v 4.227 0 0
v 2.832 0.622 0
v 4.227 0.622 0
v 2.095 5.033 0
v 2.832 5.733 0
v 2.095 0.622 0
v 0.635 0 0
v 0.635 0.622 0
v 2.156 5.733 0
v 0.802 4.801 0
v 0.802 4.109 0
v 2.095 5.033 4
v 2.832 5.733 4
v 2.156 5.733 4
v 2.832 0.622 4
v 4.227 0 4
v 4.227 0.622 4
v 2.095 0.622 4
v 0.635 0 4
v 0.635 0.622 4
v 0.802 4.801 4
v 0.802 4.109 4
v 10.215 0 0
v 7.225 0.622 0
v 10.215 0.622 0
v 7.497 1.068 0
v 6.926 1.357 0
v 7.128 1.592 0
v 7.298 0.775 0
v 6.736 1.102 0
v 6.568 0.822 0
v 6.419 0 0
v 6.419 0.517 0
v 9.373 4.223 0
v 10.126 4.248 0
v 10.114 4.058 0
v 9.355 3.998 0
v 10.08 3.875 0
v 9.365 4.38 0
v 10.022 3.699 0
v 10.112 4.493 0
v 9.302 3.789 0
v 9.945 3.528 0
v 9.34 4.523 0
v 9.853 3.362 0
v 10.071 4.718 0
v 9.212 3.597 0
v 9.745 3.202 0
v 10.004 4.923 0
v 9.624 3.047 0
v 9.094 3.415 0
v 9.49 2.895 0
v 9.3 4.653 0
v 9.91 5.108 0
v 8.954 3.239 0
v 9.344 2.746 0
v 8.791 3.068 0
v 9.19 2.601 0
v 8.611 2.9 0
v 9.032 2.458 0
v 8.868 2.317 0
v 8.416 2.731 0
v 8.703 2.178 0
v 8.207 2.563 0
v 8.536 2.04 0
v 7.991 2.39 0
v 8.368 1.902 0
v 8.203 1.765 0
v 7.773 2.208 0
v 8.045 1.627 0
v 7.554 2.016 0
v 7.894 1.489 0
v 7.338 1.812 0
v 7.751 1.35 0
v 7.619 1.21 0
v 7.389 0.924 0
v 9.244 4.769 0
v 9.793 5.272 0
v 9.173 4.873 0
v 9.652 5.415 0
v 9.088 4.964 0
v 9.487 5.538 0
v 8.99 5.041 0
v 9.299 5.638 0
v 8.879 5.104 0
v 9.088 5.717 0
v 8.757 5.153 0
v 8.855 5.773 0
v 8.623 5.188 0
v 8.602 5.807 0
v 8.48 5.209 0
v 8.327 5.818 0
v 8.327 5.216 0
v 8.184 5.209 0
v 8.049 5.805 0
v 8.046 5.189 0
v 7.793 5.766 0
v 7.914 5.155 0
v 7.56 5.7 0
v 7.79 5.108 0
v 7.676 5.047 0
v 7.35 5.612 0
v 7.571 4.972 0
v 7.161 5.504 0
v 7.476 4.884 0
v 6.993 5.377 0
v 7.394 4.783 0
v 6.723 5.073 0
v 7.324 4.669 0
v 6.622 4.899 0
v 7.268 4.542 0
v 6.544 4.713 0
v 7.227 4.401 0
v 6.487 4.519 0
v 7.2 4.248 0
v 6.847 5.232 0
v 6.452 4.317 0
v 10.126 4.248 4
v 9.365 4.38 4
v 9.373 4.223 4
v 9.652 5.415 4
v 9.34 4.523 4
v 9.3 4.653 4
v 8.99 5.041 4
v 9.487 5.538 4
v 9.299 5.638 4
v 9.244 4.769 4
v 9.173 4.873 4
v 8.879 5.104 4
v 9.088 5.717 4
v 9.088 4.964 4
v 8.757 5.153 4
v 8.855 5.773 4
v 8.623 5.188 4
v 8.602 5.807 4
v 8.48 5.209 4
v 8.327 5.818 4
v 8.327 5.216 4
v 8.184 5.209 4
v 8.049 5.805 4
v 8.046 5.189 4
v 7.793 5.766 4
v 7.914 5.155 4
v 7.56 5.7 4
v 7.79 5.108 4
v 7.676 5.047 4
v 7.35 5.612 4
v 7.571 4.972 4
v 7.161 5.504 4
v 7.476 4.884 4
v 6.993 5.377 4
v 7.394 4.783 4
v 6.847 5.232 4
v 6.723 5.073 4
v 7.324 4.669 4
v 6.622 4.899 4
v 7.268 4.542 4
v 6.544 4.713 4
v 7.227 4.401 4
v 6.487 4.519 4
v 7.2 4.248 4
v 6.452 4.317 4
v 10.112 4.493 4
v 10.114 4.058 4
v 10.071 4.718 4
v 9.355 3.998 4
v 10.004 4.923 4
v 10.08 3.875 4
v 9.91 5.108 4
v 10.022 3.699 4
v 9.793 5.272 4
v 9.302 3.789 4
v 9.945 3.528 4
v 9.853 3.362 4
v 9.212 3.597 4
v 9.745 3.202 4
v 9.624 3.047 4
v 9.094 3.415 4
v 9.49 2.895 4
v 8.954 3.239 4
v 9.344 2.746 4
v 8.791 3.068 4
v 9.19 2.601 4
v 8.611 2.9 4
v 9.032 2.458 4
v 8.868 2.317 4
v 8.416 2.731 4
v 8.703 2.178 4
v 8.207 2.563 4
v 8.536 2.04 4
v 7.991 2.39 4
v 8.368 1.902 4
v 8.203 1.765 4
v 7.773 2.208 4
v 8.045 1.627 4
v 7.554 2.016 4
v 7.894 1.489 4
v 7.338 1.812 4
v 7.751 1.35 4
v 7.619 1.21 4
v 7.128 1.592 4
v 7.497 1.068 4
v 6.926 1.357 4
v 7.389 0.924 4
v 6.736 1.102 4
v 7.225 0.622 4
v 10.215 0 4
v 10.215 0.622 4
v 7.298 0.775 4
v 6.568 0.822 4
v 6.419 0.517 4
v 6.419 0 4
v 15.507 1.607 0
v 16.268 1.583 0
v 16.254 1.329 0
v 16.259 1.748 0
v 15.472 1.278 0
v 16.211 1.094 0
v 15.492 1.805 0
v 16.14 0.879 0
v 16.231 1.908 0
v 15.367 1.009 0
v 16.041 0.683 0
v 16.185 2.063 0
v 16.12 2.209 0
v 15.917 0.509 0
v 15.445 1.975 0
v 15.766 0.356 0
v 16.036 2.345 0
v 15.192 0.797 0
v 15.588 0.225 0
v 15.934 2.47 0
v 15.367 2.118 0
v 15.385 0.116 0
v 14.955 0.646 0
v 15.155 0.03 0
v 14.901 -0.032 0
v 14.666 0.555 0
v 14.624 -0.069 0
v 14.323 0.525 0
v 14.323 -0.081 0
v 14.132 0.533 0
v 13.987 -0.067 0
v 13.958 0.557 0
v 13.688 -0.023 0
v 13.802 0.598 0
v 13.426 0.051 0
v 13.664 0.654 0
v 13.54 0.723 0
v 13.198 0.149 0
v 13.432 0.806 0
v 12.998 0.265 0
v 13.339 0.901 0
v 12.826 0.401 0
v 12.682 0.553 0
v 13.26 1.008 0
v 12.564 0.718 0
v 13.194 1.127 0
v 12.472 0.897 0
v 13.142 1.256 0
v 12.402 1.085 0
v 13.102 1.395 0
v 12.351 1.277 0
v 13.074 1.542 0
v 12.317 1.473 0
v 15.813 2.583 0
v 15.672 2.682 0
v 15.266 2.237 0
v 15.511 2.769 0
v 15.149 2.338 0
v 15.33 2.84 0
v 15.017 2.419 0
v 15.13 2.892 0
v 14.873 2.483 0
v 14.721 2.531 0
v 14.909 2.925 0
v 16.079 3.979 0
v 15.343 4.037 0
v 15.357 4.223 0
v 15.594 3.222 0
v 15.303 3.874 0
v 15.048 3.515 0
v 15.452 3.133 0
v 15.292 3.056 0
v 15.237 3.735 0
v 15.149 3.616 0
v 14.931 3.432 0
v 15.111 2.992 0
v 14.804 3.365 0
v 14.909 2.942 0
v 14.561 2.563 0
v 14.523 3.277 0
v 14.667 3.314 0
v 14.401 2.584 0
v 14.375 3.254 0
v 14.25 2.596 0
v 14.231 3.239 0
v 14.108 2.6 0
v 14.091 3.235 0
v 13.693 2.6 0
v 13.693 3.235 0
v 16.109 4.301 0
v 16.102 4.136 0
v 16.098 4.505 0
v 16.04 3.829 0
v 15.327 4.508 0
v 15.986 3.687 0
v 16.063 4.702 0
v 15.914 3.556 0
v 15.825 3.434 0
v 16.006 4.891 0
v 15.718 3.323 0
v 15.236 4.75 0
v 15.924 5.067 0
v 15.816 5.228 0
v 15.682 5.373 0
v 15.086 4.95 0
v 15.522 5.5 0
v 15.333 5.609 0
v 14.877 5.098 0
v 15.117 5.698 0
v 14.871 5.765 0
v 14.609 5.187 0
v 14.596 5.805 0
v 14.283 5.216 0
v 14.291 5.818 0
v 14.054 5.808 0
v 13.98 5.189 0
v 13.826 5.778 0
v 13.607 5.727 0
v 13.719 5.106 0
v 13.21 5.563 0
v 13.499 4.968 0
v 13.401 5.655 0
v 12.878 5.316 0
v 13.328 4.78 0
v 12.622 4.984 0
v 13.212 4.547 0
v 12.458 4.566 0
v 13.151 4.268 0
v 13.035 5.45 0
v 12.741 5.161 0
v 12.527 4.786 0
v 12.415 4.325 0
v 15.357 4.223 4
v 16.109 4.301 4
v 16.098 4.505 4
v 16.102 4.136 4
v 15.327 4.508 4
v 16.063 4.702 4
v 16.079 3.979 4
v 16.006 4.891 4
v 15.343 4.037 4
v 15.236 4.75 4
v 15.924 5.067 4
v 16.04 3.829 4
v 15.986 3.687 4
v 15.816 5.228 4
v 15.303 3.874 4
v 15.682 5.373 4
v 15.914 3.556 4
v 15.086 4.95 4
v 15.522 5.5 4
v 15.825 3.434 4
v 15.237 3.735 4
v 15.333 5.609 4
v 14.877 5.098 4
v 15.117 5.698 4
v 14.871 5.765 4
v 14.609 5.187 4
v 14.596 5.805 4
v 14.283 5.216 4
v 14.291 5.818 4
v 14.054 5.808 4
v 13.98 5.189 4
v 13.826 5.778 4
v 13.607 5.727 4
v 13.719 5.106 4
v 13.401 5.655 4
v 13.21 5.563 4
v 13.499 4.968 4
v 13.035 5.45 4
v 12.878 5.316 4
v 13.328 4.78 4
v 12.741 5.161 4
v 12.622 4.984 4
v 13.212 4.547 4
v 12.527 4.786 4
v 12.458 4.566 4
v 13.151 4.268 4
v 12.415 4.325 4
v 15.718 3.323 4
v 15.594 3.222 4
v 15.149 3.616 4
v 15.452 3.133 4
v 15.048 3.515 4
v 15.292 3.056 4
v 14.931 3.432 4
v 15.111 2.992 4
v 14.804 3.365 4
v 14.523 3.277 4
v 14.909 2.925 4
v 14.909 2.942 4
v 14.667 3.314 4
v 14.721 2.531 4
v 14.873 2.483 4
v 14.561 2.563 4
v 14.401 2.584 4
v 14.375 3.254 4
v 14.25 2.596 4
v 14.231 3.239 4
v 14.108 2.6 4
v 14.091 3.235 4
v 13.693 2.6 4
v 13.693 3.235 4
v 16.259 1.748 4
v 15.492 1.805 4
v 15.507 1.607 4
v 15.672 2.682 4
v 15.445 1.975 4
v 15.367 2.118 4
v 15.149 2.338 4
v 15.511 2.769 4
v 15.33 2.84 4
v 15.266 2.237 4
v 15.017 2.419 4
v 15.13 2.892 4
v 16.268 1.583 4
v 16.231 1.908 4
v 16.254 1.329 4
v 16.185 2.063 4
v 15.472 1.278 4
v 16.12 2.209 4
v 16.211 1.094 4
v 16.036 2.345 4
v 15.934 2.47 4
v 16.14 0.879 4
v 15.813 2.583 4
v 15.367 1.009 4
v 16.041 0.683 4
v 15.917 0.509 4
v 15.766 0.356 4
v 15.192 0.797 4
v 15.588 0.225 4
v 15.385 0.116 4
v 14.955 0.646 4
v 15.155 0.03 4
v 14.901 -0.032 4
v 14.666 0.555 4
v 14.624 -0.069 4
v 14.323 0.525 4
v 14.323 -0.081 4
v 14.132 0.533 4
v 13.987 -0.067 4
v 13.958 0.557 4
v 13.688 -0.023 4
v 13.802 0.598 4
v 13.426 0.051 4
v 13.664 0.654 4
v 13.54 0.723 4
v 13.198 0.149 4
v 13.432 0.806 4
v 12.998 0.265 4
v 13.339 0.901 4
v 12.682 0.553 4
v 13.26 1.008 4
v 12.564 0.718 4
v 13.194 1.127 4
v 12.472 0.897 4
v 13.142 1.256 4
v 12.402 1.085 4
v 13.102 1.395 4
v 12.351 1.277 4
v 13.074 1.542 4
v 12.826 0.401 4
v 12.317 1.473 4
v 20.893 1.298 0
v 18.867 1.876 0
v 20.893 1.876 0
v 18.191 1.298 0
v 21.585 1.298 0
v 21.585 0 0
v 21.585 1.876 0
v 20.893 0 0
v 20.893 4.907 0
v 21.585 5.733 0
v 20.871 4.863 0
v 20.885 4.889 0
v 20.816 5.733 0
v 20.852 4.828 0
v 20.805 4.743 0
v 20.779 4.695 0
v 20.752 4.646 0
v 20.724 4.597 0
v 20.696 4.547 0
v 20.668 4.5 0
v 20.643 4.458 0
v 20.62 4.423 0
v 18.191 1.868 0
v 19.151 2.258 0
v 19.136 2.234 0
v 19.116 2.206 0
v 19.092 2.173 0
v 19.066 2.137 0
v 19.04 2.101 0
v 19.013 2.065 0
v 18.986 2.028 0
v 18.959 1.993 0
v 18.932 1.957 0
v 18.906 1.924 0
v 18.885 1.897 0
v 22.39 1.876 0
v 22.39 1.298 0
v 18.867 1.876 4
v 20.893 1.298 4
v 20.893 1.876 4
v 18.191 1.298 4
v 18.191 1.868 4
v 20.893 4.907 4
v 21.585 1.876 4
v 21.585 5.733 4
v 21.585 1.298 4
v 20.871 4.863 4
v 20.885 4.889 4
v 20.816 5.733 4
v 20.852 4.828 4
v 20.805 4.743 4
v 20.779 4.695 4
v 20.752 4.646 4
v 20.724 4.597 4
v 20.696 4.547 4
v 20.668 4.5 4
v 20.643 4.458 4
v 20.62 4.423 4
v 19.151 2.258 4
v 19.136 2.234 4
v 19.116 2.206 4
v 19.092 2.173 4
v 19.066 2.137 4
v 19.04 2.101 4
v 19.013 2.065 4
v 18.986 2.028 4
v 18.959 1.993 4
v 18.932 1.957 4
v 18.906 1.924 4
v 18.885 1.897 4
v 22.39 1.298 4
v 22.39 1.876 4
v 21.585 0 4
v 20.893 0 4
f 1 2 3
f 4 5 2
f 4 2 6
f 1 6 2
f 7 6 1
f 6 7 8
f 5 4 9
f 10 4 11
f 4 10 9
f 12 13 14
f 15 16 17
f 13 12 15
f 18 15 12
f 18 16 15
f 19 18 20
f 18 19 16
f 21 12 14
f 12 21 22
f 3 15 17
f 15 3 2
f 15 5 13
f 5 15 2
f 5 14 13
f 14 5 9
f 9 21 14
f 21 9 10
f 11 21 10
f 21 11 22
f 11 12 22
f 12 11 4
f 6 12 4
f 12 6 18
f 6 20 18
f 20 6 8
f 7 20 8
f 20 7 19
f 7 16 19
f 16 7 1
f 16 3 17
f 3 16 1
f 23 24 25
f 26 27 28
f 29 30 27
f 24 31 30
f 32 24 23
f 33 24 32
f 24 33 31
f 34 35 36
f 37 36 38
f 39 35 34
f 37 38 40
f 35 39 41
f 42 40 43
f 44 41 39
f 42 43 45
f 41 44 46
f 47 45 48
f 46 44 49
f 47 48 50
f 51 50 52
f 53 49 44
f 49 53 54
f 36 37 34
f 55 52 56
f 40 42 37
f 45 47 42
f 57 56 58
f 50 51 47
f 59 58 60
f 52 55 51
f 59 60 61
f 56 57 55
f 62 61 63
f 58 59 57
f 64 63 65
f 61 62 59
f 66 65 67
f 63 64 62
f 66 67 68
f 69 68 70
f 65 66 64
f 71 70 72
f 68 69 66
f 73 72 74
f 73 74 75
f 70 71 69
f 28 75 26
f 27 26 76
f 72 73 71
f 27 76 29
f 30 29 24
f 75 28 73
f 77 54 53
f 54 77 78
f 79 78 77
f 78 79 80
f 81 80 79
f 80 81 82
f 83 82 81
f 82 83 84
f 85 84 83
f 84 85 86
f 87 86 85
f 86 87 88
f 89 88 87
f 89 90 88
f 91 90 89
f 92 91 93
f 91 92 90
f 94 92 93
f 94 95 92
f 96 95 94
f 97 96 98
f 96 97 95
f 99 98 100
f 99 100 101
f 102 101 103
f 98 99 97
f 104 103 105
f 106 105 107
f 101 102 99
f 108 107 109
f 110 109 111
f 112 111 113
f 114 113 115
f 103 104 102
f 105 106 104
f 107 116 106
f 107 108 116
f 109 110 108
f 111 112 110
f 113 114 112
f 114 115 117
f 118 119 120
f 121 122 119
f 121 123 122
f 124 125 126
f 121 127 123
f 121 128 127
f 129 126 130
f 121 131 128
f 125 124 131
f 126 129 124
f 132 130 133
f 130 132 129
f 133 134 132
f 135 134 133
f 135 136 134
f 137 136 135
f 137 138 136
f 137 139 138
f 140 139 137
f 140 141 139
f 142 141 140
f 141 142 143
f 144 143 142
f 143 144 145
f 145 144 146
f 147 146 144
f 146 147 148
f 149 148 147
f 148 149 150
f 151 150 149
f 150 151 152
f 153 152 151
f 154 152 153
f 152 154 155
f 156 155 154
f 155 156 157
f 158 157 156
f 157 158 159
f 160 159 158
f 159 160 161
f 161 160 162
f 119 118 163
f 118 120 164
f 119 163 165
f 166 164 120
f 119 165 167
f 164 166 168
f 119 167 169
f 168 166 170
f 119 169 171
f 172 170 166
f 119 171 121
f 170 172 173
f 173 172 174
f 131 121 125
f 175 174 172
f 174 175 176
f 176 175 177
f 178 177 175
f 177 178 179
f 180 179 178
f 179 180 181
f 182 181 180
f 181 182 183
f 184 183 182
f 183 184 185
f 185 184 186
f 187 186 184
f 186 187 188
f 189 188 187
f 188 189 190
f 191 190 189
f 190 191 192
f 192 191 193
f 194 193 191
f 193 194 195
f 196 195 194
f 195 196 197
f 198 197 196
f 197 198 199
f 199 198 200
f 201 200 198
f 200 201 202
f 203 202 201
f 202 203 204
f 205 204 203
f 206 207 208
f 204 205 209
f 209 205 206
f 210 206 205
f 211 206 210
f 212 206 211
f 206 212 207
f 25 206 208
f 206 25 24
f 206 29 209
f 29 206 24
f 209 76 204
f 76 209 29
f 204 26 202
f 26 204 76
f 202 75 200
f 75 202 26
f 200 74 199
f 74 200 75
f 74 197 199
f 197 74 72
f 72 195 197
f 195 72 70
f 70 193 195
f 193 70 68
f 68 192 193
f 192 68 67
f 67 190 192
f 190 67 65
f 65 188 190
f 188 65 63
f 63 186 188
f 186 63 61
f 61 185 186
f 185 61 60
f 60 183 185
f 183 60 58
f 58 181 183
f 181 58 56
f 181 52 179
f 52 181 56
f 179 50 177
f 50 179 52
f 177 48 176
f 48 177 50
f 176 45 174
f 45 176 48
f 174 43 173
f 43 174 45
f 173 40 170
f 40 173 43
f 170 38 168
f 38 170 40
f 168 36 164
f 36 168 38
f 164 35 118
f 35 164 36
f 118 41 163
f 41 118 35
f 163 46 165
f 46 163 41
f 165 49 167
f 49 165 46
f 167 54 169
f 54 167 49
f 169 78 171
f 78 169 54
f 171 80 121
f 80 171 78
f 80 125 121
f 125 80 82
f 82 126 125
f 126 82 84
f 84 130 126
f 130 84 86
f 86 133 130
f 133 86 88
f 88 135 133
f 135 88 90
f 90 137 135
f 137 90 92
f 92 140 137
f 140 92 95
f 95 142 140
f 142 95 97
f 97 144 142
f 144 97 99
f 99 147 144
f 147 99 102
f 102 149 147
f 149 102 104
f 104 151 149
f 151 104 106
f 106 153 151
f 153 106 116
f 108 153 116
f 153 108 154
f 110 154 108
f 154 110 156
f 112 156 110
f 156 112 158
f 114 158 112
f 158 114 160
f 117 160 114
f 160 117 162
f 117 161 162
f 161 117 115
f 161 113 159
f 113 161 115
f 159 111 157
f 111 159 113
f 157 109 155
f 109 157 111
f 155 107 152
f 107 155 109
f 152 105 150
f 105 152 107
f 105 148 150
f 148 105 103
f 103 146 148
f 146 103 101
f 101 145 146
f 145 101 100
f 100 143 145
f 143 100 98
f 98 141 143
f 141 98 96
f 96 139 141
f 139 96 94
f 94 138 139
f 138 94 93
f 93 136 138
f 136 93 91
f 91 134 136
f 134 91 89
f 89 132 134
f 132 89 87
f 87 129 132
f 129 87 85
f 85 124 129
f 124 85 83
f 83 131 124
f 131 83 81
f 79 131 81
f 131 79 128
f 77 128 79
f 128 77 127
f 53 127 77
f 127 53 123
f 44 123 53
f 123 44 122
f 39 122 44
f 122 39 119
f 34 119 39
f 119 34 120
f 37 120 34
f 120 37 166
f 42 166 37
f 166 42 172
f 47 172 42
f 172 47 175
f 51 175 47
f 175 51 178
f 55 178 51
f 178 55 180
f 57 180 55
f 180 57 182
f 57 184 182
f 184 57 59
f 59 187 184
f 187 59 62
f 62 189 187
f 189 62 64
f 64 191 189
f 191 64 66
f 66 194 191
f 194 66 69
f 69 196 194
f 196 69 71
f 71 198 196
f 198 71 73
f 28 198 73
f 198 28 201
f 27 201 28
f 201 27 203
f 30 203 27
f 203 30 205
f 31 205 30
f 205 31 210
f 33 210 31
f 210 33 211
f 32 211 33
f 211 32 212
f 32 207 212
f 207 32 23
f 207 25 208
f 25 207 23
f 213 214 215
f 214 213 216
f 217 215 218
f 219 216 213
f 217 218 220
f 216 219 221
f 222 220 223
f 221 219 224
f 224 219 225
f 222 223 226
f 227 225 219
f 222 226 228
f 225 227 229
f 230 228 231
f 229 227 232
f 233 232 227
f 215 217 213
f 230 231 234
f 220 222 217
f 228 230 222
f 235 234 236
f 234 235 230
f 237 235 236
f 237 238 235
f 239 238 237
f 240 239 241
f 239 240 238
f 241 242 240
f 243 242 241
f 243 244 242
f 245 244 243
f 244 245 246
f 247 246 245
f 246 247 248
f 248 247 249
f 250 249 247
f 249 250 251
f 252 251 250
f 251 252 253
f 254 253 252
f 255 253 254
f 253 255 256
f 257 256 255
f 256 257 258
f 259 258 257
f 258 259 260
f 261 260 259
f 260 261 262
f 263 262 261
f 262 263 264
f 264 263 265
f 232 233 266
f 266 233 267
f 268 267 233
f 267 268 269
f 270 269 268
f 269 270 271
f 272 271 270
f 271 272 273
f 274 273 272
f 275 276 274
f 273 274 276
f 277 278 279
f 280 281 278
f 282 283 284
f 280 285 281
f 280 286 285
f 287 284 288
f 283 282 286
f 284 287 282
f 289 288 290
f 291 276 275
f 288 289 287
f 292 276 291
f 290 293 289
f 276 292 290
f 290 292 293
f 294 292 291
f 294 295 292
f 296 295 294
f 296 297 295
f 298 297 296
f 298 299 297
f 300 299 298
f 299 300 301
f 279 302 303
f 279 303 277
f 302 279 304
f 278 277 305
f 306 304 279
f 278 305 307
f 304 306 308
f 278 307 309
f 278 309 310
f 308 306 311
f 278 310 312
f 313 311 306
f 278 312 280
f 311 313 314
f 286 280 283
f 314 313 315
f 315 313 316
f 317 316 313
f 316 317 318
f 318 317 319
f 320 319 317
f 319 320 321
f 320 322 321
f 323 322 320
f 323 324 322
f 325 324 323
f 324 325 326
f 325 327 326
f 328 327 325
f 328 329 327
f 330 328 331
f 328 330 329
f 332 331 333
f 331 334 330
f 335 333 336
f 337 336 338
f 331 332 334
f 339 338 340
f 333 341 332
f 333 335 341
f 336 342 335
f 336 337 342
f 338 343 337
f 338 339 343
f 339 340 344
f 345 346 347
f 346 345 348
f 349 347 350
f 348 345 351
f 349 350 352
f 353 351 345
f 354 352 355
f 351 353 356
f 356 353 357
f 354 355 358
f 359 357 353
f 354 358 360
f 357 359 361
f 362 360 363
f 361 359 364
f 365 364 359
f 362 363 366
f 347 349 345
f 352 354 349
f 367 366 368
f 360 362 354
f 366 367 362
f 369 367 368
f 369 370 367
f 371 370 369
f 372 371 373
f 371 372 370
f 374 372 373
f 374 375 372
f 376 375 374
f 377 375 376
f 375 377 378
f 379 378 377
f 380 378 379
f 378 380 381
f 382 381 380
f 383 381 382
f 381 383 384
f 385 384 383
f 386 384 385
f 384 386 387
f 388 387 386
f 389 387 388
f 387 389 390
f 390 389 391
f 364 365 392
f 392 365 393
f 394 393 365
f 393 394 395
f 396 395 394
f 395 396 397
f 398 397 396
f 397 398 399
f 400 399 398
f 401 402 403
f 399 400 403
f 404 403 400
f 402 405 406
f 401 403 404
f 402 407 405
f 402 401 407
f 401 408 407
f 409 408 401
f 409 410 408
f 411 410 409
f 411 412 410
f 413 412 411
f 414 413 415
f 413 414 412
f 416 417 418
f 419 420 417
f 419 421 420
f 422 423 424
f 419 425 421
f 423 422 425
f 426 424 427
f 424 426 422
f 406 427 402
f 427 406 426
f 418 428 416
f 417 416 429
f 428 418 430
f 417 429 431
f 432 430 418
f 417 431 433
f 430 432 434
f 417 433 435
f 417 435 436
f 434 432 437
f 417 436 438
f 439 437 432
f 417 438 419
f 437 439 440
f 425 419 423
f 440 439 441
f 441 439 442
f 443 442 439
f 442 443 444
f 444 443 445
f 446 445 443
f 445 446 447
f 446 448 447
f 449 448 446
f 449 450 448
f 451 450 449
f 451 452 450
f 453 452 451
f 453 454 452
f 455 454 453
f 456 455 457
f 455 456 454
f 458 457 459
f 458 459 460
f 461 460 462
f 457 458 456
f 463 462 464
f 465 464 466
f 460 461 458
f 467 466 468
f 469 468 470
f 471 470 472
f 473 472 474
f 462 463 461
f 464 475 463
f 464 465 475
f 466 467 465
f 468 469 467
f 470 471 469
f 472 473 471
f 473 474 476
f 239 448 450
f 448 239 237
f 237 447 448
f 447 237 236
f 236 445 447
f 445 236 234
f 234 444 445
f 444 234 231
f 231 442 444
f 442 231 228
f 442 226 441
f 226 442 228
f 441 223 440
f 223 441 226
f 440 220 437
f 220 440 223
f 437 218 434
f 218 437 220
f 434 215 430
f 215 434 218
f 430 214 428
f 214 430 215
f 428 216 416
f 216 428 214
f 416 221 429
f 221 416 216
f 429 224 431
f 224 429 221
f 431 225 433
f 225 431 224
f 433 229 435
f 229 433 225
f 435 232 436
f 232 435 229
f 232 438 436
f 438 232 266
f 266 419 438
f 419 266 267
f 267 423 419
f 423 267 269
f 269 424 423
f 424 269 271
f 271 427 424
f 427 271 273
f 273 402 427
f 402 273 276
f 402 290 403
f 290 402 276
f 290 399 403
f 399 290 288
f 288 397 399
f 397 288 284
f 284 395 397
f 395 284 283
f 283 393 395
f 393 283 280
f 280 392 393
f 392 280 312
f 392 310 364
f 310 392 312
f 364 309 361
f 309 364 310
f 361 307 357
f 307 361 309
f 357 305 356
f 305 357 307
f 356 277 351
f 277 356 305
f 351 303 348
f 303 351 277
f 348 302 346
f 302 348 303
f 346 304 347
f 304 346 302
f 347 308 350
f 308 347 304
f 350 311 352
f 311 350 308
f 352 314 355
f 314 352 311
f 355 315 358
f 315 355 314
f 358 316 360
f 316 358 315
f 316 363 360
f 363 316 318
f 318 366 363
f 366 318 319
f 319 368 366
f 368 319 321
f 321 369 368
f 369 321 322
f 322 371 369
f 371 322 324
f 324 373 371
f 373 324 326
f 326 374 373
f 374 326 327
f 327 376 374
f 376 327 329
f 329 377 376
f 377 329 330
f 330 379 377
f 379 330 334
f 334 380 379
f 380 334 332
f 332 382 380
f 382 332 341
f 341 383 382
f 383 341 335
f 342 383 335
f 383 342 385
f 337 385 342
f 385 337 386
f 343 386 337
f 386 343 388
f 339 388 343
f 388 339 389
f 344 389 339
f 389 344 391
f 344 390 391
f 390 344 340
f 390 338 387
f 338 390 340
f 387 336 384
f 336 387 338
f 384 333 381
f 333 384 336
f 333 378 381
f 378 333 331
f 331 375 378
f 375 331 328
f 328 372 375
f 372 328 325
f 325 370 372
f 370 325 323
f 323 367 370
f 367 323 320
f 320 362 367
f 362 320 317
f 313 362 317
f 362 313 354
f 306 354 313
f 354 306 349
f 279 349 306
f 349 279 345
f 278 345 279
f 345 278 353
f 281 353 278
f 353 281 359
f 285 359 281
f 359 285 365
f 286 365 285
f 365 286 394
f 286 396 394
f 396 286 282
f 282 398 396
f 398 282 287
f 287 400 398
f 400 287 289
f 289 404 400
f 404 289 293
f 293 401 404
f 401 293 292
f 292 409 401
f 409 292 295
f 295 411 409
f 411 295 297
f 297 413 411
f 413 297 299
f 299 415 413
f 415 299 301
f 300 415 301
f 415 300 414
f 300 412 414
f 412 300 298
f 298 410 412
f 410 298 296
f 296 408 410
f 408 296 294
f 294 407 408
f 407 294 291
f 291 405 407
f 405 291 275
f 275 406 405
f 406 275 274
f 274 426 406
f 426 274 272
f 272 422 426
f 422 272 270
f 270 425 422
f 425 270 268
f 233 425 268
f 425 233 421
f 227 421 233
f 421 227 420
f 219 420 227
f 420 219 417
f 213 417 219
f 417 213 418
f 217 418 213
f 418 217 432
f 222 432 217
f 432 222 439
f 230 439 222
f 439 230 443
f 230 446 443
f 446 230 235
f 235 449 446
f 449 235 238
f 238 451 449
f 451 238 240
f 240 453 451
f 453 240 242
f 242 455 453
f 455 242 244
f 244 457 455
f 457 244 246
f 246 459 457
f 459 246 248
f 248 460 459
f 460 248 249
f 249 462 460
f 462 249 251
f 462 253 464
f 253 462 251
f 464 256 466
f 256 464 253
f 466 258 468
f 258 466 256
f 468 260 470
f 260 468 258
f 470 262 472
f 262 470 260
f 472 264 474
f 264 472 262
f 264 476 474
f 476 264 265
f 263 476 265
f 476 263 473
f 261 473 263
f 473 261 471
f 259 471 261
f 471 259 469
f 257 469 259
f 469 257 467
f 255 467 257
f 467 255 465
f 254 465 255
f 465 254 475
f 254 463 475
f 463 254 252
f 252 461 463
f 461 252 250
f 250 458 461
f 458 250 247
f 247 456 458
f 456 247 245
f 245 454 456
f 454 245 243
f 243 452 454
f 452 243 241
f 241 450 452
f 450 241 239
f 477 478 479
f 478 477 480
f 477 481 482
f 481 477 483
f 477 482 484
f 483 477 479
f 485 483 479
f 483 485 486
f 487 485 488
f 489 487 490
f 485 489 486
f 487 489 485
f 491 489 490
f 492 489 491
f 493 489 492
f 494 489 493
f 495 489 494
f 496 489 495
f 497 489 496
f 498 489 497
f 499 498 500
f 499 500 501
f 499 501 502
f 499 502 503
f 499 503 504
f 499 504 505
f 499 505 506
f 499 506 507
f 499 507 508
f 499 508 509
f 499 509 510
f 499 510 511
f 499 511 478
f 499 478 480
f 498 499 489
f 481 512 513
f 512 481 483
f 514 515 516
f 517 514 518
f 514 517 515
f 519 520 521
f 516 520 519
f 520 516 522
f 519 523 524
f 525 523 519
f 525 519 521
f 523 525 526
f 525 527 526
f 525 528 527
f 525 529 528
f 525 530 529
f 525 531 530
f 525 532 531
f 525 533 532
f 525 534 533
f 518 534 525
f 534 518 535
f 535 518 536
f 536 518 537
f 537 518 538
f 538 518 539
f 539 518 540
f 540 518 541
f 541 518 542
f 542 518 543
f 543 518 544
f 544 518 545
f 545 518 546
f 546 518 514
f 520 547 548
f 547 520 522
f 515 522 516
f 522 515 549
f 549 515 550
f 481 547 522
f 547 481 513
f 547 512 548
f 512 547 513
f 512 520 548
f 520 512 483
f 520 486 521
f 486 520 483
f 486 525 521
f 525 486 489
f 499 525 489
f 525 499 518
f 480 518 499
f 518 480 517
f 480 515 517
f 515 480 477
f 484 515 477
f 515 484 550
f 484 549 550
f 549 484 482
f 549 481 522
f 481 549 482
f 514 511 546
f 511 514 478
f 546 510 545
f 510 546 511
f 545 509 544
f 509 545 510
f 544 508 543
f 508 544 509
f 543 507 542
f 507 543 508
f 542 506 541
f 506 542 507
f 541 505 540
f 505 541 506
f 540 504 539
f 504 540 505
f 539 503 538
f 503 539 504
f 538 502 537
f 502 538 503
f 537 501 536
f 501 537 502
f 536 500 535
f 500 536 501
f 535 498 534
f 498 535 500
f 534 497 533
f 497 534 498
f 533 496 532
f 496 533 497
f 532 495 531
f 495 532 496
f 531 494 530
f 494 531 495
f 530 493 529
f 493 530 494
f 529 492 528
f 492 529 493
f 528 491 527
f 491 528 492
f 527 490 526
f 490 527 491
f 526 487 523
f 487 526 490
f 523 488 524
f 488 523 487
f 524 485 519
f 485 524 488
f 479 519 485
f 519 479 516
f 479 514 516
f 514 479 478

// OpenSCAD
font = "Bauhaus 93:style=Regular";
font = "Arial";

strings = [["ABC", "1234", "QRS"], ["+-=", "foo", "bar"]];

oneString = strings[0][1];
echo(oneString);

endIndex = len(oneString) - 1;
for(i = [0 : endIndex])
{
    element = oneString;
    
    // print a single character
    ch = element[i];
    echo(ch);
    
    translate([i*6, 0, 0])
    linear_extrude(height=4)
    text(ch, font=font, size=6);
}
